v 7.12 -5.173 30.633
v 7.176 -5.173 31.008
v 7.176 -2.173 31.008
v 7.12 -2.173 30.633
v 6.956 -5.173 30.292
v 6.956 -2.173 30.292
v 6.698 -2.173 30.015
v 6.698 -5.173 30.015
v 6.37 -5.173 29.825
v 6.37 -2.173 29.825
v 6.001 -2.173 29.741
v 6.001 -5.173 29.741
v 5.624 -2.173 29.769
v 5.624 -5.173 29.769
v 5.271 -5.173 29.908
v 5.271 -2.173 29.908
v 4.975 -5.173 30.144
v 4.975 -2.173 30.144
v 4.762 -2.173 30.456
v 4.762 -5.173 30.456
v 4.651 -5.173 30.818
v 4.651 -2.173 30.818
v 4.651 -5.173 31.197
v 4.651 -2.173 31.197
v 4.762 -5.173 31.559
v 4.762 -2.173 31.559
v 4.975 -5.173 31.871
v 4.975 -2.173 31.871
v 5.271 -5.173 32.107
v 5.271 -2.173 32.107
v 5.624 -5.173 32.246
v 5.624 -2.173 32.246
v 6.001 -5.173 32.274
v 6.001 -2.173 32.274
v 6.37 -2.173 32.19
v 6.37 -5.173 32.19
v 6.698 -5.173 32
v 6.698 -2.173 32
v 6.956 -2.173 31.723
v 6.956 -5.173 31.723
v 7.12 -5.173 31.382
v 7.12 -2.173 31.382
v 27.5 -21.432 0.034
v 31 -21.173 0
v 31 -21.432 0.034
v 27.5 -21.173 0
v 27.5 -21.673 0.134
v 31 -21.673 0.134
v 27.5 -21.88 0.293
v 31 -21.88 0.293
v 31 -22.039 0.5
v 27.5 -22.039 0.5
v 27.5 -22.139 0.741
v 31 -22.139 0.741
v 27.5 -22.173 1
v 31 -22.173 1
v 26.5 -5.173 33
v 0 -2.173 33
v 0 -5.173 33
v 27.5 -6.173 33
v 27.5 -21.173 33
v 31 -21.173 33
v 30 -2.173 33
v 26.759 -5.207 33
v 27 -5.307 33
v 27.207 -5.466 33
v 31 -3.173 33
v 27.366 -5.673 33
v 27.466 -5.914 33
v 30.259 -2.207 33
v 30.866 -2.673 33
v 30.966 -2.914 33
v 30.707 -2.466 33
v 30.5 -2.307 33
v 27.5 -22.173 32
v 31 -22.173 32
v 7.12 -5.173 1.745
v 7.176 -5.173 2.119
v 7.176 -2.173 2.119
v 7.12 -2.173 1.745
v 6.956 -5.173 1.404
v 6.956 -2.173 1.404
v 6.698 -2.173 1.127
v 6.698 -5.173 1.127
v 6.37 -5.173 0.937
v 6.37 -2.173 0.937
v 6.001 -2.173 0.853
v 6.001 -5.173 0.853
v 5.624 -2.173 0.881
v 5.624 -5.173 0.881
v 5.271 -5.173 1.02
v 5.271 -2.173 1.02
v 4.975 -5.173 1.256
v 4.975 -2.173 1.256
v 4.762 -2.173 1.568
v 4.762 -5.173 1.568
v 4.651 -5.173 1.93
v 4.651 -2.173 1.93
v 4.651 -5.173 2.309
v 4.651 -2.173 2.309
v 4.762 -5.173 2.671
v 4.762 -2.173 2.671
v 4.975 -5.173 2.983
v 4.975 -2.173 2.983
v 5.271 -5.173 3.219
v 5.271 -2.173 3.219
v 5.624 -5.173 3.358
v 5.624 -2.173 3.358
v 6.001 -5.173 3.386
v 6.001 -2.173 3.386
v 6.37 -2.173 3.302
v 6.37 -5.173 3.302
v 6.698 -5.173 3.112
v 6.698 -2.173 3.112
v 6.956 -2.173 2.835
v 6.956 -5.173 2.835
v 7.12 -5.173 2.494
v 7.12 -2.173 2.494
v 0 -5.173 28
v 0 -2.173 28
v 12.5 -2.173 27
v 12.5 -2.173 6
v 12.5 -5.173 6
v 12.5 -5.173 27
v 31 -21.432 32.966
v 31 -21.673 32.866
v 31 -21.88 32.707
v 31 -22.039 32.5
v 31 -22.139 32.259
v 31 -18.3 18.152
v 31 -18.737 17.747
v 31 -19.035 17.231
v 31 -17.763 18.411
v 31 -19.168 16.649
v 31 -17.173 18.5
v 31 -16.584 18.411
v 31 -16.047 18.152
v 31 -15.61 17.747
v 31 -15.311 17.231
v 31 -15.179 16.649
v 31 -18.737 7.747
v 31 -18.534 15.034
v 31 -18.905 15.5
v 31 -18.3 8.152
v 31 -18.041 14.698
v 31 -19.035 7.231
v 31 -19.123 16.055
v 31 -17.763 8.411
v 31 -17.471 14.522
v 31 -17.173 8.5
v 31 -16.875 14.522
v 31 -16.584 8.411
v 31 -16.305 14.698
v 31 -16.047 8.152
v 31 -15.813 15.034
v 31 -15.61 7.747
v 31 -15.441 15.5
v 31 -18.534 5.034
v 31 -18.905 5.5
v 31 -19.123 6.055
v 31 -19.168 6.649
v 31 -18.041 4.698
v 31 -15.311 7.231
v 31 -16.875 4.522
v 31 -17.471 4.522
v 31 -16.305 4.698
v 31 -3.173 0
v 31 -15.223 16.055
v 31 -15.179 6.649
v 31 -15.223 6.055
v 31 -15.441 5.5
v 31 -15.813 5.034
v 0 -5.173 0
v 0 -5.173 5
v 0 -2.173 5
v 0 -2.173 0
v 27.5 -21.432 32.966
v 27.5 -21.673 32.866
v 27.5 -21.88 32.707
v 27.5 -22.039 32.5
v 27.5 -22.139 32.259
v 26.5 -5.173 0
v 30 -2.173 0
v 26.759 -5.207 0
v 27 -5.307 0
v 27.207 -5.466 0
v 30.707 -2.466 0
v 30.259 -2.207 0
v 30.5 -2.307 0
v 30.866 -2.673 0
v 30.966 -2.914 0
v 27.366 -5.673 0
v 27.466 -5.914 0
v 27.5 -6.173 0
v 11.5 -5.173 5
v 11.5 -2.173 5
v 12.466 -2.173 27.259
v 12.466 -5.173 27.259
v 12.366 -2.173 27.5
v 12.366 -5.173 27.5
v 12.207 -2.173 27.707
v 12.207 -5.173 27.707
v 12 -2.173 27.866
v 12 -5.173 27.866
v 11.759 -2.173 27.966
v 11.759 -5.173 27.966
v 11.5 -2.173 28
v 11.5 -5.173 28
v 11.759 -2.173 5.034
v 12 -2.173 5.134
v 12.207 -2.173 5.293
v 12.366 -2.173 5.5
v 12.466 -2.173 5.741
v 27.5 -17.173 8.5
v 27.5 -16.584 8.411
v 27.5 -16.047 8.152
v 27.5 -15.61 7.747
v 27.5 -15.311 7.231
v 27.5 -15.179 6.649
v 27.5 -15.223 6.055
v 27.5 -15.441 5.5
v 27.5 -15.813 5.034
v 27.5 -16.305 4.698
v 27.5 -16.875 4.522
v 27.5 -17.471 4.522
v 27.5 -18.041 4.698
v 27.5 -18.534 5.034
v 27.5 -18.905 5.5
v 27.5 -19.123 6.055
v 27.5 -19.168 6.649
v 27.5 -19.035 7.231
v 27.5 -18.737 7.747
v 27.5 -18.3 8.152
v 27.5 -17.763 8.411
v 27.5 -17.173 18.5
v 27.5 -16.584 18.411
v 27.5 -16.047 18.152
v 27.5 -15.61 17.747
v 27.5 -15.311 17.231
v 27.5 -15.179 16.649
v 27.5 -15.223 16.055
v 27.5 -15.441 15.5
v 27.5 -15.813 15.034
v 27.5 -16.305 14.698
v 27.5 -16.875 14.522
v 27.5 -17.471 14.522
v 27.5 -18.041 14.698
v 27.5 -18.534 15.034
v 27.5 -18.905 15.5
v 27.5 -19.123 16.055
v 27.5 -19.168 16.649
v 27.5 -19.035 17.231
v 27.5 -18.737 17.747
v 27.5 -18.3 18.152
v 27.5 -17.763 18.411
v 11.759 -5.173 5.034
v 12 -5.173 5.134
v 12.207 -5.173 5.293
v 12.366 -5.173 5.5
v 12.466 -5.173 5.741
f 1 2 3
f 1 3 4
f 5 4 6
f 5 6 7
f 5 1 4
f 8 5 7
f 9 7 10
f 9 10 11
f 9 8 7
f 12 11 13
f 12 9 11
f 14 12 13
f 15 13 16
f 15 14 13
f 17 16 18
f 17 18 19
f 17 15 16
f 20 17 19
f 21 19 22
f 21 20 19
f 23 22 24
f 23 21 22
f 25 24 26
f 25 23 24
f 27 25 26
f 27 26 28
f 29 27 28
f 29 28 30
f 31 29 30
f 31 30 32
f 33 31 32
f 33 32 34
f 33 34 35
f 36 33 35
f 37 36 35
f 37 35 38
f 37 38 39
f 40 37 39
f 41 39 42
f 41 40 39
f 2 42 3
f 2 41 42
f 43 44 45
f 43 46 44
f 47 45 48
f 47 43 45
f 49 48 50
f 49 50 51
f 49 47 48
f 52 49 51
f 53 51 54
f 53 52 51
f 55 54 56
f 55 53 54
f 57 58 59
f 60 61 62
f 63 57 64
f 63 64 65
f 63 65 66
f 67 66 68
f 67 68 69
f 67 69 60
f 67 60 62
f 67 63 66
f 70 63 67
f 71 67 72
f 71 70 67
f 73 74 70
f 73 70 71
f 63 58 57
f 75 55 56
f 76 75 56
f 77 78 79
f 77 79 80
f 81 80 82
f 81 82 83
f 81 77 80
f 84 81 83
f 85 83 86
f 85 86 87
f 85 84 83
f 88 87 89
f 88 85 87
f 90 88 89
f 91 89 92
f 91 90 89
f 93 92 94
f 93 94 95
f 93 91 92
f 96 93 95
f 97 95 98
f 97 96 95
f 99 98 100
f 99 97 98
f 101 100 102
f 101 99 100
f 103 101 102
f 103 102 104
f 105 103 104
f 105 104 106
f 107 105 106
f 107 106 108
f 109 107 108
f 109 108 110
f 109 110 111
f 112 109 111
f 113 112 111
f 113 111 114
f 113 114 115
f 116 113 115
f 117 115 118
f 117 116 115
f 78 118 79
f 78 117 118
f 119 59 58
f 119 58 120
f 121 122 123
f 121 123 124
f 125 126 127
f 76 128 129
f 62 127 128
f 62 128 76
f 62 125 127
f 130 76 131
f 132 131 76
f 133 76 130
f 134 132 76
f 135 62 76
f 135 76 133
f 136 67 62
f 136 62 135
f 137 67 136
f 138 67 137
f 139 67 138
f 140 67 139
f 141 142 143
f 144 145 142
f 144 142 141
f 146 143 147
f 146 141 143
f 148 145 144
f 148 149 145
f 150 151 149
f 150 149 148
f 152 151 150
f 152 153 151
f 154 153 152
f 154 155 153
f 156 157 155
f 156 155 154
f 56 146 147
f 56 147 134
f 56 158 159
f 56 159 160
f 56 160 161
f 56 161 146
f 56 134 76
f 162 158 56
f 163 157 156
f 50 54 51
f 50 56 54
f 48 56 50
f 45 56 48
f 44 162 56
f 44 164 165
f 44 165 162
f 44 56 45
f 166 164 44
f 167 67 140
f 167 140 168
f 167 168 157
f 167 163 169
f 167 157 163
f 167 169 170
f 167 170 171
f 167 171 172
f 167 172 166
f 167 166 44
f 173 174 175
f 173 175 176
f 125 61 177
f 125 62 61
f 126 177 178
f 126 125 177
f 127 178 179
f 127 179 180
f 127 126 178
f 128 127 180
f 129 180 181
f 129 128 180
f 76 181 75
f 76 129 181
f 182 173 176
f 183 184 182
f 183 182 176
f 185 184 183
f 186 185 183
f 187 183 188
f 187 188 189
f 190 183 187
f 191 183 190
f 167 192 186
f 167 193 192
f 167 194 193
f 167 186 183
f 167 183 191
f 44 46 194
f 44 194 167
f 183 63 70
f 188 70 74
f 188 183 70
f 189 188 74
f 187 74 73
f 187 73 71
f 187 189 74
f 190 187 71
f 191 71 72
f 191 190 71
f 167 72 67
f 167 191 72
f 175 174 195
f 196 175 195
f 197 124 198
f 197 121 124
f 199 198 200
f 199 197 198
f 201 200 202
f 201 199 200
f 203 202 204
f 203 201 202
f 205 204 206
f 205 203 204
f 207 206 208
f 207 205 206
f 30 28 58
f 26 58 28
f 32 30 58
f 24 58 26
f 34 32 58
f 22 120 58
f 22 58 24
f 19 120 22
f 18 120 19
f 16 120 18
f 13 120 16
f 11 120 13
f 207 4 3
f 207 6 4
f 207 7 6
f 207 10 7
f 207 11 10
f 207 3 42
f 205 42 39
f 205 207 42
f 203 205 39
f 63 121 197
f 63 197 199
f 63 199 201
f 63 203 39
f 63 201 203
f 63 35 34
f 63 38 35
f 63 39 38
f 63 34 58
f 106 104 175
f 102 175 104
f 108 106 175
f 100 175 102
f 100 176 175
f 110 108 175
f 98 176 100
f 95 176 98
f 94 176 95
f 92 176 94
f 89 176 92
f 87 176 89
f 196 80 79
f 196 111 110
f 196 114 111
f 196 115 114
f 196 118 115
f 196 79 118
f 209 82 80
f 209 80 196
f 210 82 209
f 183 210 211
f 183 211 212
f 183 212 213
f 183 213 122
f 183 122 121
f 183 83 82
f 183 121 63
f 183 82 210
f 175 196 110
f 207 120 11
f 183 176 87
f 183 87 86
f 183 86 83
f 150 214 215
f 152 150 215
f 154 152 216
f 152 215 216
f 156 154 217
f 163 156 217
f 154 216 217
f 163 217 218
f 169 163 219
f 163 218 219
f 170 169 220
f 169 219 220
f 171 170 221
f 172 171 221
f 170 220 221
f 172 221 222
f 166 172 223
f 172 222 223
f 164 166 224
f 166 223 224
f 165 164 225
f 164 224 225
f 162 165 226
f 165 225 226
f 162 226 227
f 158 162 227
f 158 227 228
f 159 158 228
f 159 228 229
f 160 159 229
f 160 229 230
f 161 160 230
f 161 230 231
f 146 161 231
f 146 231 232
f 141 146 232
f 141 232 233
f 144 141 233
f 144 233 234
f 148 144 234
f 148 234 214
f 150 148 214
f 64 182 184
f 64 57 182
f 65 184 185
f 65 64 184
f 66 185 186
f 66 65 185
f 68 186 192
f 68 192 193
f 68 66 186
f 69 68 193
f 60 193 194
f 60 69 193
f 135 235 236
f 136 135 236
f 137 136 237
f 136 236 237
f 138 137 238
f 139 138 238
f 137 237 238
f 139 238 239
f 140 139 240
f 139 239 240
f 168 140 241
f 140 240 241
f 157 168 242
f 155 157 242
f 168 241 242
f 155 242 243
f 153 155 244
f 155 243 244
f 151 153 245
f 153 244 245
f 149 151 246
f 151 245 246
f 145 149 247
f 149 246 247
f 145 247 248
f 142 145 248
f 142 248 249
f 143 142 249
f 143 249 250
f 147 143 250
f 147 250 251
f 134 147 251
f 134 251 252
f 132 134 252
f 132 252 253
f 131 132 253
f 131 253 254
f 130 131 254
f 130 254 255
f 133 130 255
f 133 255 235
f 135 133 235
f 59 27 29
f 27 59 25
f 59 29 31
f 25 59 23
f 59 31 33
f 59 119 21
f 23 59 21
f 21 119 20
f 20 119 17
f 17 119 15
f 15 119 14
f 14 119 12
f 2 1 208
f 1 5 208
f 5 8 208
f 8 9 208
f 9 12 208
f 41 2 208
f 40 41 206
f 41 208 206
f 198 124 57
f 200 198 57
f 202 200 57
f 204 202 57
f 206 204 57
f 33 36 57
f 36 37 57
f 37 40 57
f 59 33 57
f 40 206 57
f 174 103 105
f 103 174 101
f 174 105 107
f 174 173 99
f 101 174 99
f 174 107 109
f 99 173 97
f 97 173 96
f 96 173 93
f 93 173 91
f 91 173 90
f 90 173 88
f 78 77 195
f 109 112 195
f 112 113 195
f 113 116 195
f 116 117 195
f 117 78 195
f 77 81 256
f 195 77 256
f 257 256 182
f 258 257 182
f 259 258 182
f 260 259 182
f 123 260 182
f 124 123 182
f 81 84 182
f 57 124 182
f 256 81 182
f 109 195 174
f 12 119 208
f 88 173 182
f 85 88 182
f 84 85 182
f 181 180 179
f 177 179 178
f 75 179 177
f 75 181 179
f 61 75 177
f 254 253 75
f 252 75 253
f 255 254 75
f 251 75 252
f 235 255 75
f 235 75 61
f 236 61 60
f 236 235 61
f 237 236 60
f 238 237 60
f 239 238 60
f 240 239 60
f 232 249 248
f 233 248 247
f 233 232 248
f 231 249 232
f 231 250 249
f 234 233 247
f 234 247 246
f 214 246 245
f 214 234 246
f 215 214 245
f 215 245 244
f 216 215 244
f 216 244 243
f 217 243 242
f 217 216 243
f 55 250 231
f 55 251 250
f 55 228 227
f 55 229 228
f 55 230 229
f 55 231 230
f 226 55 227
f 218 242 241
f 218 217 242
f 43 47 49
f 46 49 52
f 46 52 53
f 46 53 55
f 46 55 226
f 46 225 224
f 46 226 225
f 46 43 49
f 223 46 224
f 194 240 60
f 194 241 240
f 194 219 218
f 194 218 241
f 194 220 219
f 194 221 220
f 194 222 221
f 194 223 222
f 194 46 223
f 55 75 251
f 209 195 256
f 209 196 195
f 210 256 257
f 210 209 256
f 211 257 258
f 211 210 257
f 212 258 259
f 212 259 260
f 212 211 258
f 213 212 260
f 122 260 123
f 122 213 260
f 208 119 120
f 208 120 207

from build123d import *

# Parameters (mm, degrees)
SKETCH1_W             = 15
SKETCH1_H             = 5
SKETCH1_R             = 1.27
BOSS_EXTRUDE1_DEPTH   = 3
BOSS_EXTRUDE1_2_DEPTH = 3
SKETCH2_W             = 2.5
SKETCH2_H             = 28
SKETCH2_H_2           = 5
BOSS_EXTRUDE2_DEPTH   = 20
SKETCH3_W             = 15
SKETCH3_H             = 17
CUT_EXTRUDE1_DEPTH    = 34
SKETCH4_R             = 2
CUT_EXTRUDE2_DEPTH    = 4.5
FILLET1_R             = 1


with BuildPart() as part:
    # Sketch1 → Boss-Extrude1 (new body)
    with BuildSketch(Plane(origin=(0, -5.173201946, 0), x_dir=(1, 0, 0), z_dir=(0, 1, 0))):
        with Locations((7.5, -2.5)):
            Rectangle(SKETCH1_W, SKETCH1_H)
        with Locations((5.906433977, -2.119480538)):
            Circle(SKETCH1_R, mode=Mode.SUBTRACT)
    extrude(amount=BOSS_EXTRUDE1_DEPTH)



with BuildPart() as body_2:
    # Sketch1 → Boss-Extrude1 2 (new body)
    with BuildSketch(Plane(origin=(0, -5.173201946, 0), x_dir=(1, 0, 0), z_dir=(0, 1, 0))):
        with Locations((7.5, -30.5)):
            Rectangle(SKETCH1_W, SKETCH1_H)
        with Locations((5.906433977, -31.007519462)):
            Circle(SKETCH1_R, mode=Mode.SUBTRACT)
    extrude(amount=BOSS_EXTRUDE1_2_DEPTH)


with BuildPart() as part_1:
    add(part.part)

    add(body_2.part)  # Boss-Extrude2 merges body 2
    # Sketch2 → Boss-Extrude2 (add)
    with BuildSketch(Plane(origin=(0, -2.173201946, 0), x_dir=(1, 0, 0), z_dir=(0, 1, 0))):
        with Locations((13.75, -14)):
            Rectangle(SKETCH2_W, SKETCH2_H)
        Polygon((31, 0), (15, 0), (15, -28), (15, -33), (31, -33), align=None)
        with Locations((13.75, -30.5)):
            Rectangle(SKETCH2_W, SKETCH2_H_2)
    extrude(amount=-BOSS_EXTRUDE2_DEPTH)

    # Sketch3 → Cut-Extrude1 (cut, through all)
    with BuildSketch(Plane(origin=(0, 0, 0), x_dir=(-1, 0, 0), z_dir=(0, 0, -1))):
        with Locations((-20, -13.673201946)):
            Rectangle(SKETCH3_W, SKETCH3_H)
    extrude(amount=-CUT_EXTRUDE1_DEPTH, mode=Mode.SUBTRACT)

    # Sketch4 → Cut-Extrude2 (cut, through all)
    with BuildSketch(Plane.ZY.offset(-27.5)):
        with Locations((16.5, -17.173201946)):
            Circle(SKETCH4_R)
        with Locations((6.5, -17.173201946)):
            Circle(SKETCH4_R)
    extrude(amount=-CUT_EXTRUDE2_DEPTH, mode=Mode.SUBTRACT)

    # Fillet1
    fillet1_edges = [part_1.edges().sort_by_distance(p)[0] for p in [
        (12.5, -3.673201946, 5),
        (31, -2.173201946, 16.5),
        (12.5, -3.673201946, 28),
        (29.25, -22.173201946, 33),
        (29.25, -22.173201946, 0),
        (27.5, -5.173201946, 16.5),
    ]]
    fillet(fillet1_edges, radius=FILLET1_R)


solid = part_1.part
